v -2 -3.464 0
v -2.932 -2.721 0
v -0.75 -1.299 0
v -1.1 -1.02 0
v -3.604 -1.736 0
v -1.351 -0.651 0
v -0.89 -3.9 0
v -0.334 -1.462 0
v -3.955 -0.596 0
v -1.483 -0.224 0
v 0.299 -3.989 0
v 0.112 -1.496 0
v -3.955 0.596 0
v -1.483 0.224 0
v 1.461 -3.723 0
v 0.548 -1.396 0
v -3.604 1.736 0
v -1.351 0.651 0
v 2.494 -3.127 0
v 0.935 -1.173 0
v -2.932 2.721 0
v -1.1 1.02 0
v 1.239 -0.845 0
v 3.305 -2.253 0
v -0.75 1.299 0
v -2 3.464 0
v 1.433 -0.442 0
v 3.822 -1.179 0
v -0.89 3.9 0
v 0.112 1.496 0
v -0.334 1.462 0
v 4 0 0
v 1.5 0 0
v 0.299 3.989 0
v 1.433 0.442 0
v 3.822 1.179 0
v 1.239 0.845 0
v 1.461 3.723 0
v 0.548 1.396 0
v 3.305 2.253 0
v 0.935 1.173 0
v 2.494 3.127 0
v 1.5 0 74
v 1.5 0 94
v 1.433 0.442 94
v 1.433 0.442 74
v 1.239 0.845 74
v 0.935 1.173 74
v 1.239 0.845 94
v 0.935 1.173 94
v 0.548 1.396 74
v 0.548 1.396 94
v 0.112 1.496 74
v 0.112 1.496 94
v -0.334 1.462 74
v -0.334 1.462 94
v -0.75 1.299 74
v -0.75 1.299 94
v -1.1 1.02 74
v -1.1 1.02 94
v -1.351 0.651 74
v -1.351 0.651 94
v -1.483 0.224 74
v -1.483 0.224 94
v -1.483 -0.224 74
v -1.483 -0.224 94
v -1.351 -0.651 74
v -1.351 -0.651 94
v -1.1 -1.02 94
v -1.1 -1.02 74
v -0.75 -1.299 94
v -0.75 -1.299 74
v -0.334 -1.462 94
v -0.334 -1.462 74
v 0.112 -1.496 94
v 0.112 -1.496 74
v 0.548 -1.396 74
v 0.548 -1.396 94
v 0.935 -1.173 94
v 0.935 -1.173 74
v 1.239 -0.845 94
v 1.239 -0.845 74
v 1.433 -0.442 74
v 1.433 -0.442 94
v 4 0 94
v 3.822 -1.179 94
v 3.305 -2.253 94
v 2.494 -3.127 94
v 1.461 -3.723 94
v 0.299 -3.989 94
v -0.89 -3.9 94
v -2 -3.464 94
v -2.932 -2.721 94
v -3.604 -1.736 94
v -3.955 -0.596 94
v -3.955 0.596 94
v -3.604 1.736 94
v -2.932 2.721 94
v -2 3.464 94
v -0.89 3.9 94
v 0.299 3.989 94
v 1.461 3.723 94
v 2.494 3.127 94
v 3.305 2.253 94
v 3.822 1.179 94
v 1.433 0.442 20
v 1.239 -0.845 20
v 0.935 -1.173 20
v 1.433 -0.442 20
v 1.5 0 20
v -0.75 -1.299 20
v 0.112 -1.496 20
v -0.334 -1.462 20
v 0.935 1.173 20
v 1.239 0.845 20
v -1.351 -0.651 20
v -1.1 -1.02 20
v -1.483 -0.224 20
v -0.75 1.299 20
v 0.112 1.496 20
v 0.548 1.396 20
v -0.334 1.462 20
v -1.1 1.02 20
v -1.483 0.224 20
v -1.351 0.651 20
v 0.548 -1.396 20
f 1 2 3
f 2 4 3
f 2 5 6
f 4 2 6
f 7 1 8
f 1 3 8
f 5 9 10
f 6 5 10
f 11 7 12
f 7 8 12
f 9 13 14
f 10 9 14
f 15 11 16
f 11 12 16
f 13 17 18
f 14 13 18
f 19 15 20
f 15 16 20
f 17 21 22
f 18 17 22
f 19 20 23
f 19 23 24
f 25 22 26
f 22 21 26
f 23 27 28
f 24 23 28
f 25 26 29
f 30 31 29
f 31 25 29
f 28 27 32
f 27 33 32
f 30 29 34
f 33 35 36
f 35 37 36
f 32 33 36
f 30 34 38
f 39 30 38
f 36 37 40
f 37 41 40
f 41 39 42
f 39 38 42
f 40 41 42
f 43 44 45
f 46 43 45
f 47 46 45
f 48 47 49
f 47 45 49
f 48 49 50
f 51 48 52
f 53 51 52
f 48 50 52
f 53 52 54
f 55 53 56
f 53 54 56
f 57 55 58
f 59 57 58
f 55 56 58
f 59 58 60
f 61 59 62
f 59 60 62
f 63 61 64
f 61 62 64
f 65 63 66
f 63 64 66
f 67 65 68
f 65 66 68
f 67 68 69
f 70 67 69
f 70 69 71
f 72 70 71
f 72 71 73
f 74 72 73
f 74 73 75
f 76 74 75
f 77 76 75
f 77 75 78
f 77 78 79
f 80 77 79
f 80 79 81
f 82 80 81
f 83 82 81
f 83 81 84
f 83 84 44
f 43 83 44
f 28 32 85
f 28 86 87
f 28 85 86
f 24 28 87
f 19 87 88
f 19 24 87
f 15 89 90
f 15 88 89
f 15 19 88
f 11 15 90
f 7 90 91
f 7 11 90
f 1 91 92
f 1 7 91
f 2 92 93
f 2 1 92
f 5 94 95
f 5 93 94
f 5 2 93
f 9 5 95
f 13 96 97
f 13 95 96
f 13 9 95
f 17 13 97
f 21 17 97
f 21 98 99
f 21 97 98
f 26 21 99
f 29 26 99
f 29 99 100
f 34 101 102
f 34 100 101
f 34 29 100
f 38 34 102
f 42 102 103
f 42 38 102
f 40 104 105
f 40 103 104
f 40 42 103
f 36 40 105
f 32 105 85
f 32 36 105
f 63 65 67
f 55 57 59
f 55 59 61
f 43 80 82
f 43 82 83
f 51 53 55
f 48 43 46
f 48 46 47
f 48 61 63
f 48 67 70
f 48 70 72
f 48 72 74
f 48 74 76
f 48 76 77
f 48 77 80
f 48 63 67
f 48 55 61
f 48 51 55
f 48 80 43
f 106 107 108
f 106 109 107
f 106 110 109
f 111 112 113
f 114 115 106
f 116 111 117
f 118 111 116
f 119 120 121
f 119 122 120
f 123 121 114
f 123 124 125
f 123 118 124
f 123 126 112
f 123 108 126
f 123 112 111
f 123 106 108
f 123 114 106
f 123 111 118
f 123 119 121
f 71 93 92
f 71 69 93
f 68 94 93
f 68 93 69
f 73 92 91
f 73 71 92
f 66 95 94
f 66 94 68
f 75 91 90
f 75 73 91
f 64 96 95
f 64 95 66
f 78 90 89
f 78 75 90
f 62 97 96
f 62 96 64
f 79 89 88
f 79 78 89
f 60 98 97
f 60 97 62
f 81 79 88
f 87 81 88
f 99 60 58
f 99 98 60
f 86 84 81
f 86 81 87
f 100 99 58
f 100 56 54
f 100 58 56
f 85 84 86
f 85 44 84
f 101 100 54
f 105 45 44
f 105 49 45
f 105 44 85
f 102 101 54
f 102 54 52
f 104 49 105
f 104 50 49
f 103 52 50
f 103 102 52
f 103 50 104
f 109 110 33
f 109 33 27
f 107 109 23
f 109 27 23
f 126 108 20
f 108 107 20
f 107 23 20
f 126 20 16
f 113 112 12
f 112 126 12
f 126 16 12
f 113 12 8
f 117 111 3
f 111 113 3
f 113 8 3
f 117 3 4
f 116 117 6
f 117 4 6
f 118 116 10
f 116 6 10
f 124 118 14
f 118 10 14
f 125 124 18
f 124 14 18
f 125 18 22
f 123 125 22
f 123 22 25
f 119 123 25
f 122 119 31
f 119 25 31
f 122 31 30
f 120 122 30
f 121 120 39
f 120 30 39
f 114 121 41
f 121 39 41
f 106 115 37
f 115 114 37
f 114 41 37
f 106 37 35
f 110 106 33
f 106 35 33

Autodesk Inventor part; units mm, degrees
ref_plane "YZ Plane" through (0, 0, 0) normal (1, 0, 0) x (0, 1, 0)
ref_plane "XZ Plane" through (0, 0, 0) normal (0, 1, 0) x (-1, 0, 0)
sketch "Sketch1" plane through (0, 0, 0) normal (0, 0, 1) x (1, 0, 0)
  circle A0 centre (0, 0) radius 4
  dimension "d0" = 8
extrude "Extrusion1" add sketch "Sketch1" along normal blind 94
sketch "Sketch2" plane through (0, 0, 94) normal (0, 0, 1) x (1, 0, 0)
  circle A0 centre (0, 0) radius 1.5
  dimension "d3" = 3
extrude "Extrusion2" cut sketch "Sketch2" against normal blind 20
ref_plane "Work Plane1" through (0, 0, 47) normal (0, 0, -1) x (-1, 0, 0)
mirror "Mirror1" about plane through (0, 0, 47) normal (0, 0, -1) of "Extrusion2"
properties part number "BatteryHolderRod"
